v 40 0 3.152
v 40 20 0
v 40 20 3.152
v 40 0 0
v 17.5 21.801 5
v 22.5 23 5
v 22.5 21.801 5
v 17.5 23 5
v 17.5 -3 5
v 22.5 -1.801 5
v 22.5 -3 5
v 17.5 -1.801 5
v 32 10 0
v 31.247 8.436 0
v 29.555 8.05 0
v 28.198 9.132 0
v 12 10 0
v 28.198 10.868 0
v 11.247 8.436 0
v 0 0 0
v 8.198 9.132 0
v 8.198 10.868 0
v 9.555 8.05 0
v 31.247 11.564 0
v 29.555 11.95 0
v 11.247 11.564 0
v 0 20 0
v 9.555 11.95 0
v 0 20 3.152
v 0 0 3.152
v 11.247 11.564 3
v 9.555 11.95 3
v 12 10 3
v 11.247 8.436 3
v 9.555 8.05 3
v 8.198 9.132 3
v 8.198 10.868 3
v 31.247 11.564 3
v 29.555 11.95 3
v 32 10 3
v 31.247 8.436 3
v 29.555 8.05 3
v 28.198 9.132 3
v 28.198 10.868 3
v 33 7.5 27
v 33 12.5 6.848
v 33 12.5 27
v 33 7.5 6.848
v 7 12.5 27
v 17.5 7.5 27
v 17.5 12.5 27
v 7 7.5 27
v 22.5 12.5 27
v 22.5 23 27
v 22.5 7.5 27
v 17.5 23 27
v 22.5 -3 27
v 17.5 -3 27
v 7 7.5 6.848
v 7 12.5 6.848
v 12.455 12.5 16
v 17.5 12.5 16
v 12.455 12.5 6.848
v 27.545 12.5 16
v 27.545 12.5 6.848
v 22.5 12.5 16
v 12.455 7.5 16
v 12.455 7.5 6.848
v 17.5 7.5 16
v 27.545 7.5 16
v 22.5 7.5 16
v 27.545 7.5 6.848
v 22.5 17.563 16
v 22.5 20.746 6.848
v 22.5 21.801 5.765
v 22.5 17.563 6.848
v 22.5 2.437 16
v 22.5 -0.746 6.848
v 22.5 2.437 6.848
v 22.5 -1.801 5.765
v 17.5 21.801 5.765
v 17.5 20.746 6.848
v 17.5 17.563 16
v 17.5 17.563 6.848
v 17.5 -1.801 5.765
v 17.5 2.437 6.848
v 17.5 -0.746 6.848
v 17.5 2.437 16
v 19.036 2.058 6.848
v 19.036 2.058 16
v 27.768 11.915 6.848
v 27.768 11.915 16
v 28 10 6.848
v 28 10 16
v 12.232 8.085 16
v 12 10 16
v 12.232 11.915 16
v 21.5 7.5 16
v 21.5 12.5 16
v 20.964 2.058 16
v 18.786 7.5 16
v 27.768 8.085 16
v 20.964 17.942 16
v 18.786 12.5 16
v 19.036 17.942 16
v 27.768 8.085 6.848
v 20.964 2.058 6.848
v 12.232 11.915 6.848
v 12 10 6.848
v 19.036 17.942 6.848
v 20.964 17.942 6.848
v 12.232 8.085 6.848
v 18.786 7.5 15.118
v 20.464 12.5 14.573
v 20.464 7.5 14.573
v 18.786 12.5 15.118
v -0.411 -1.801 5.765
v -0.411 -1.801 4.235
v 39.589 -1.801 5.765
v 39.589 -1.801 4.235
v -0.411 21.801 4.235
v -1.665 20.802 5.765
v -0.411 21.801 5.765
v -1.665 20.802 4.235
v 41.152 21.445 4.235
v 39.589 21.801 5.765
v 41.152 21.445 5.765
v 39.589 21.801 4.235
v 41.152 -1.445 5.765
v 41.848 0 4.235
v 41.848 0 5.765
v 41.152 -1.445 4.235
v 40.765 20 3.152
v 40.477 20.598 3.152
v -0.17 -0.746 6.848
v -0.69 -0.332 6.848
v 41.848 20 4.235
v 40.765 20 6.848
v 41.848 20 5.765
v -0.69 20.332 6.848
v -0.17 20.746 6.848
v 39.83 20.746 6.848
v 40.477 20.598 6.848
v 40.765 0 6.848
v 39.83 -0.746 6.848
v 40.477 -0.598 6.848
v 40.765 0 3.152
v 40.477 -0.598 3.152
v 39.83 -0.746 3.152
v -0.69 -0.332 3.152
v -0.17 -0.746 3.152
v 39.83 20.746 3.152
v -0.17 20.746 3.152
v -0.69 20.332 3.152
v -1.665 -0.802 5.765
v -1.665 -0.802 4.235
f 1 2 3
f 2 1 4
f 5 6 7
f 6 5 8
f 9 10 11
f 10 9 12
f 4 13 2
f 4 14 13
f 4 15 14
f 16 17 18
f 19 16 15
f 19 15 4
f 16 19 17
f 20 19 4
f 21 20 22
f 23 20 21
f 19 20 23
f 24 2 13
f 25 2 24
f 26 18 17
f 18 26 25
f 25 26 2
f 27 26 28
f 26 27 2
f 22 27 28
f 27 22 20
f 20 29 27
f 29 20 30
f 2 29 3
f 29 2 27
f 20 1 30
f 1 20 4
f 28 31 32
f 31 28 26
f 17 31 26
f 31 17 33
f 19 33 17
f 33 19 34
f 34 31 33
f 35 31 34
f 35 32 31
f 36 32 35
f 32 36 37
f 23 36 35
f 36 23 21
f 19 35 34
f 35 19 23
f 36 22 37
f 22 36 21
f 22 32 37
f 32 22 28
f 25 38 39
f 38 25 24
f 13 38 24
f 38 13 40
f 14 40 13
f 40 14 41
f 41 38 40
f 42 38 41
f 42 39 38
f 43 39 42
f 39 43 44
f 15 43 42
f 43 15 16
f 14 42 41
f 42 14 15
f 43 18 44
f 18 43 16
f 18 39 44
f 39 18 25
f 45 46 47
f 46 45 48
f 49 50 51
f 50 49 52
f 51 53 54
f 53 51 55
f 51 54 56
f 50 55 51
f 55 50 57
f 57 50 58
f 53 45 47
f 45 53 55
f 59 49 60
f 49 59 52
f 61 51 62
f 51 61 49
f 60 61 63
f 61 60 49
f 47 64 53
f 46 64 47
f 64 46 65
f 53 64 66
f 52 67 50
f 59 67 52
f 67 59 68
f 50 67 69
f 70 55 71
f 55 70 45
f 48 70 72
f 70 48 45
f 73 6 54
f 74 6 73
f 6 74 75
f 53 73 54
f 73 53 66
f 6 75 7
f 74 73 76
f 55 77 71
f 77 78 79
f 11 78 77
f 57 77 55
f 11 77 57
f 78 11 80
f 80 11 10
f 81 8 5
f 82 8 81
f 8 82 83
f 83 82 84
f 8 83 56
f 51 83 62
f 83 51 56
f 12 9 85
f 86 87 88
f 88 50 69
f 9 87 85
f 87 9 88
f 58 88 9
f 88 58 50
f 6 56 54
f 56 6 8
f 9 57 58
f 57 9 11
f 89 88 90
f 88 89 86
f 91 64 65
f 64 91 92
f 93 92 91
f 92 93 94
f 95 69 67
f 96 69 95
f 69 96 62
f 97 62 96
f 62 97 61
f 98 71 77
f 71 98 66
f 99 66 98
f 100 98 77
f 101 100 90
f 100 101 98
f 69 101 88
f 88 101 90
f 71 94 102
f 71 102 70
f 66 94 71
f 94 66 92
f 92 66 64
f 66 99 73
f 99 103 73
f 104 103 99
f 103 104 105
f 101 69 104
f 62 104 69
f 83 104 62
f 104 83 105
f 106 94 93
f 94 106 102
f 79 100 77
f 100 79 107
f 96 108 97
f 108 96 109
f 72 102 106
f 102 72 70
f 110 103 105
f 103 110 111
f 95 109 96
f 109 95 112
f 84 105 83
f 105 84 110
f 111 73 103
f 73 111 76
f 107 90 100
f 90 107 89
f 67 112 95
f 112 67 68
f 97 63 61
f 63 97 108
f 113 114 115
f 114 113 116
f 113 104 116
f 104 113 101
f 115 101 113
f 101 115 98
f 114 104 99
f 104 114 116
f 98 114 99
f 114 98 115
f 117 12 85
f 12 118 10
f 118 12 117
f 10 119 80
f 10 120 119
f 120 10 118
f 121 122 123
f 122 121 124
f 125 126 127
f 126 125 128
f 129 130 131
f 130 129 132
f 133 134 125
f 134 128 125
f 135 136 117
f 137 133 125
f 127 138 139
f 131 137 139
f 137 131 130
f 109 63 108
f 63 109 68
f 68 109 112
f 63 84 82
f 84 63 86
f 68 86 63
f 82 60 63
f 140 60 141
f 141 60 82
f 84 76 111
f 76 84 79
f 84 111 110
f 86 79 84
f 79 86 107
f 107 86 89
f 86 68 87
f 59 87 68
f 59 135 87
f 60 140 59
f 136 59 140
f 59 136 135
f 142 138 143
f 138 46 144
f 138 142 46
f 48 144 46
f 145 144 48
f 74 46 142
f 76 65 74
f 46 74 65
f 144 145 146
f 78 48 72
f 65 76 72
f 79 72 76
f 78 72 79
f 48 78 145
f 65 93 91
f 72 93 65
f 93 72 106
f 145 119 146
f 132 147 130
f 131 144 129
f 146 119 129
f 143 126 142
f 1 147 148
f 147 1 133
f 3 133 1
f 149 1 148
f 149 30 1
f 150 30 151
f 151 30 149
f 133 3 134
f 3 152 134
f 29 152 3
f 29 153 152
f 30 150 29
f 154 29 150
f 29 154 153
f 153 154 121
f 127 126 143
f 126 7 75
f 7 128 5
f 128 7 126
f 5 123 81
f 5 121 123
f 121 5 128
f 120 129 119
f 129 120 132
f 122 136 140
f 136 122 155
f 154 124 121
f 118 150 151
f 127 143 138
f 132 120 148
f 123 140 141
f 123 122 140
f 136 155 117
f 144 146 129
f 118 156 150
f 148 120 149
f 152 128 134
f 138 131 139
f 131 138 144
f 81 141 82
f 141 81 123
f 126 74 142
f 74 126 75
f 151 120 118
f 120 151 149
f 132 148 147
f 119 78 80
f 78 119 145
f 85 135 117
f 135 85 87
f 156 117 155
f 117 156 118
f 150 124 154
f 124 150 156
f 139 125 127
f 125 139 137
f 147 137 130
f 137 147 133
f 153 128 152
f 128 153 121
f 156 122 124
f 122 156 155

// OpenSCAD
// Parameters
rod_diameter = 16.0;
bracket_height = 27.0;
base_thickness = 5.0;
base_length = 40.0;
base_width = 20.0;
mounting_hole_diameter = 4.0;
mounting_hole_offset = 10.0;
clamp_thickness = 5.0;
clamp_height = bracket_height - base_thickness;
clamp_width = rod_diameter + 2 * clamp_thickness;
set_screw_diameter = 3.0;
set_screw_offset = 5.0;

// Base mount block
module base_mount_block() {
    difference() {
        cube([base_length, base_width, base_thickness]);
        translate([mounting_hole_offset, base_width / 2, 0])
            cylinder(h = base_thickness + 1, d = mounting_hole_diameter, center = true);
        translate([base_length - mounting_hole_offset, base_width / 2, 0])
            cylinder(h = base_thickness + 1, d = mounting_hole_diameter, center = true);
    }
}

// Rod cradle or clamp
module rod_cradle_or_clamp() {
    translate([base_length / 2, base_width / 2, base_thickness])
        difference() {
            union() {
                translate([-clamp_width / 2, -clamp_thickness / 2, 0])
                    cube([clamp_width, clamp_thickness, clamp_height]);
                translate([-clamp_thickness / 2, -clamp_width / 2, 0])
                    cube([clamp_thickness, clamp_width, clamp_height]);
            }
            translate([0, 0, 0])
                cylinder(h = clamp_height, d = rod_diameter, center = true);
        }
}

// Rod retention feature (set screw boss)
module rod_retention_feature() {
    translate([base_length / 2, base_width / 2, base_thickness + clamp_height / 2])
        rotate([90, 0, 0])
            cylinder(h = clamp_thickness, d = set_screw_diameter, center = true);
}

// Fillets or chamfers
module fillets_or_chamfers() {
    // Example chamfer on the base edges
    translate([0, 0, 0])
        hull() {
            translate([0, 0, base_thickness])
                sphere(r = 2);
            translate([base_length, 0, base_thickness])
                sphere(r = 2);
            translate([0, base_width, base_thickness])
                sphere(r = 2);
            translate([base_length, base_width, base_thickness])
                sphere(r = 2);
        }
}

// Rod (for visualization)
module rod() {
    translate([base_length / 2, base_width / 2, base_thickness + clamp_height / 2])
        cylinder(h = 100, d = rod_diameter, center = true);
}

// Assemble the bracket
module shaft_support_bracket() {
    base_mount_block();
    rod_cradle_or_clamp();
    rod_retention_feature();
    fillets_or_chamfers();
}

// Render the model
shaft_support_bracket();
// Uncomment the following line to visualize the rod
// rod();
